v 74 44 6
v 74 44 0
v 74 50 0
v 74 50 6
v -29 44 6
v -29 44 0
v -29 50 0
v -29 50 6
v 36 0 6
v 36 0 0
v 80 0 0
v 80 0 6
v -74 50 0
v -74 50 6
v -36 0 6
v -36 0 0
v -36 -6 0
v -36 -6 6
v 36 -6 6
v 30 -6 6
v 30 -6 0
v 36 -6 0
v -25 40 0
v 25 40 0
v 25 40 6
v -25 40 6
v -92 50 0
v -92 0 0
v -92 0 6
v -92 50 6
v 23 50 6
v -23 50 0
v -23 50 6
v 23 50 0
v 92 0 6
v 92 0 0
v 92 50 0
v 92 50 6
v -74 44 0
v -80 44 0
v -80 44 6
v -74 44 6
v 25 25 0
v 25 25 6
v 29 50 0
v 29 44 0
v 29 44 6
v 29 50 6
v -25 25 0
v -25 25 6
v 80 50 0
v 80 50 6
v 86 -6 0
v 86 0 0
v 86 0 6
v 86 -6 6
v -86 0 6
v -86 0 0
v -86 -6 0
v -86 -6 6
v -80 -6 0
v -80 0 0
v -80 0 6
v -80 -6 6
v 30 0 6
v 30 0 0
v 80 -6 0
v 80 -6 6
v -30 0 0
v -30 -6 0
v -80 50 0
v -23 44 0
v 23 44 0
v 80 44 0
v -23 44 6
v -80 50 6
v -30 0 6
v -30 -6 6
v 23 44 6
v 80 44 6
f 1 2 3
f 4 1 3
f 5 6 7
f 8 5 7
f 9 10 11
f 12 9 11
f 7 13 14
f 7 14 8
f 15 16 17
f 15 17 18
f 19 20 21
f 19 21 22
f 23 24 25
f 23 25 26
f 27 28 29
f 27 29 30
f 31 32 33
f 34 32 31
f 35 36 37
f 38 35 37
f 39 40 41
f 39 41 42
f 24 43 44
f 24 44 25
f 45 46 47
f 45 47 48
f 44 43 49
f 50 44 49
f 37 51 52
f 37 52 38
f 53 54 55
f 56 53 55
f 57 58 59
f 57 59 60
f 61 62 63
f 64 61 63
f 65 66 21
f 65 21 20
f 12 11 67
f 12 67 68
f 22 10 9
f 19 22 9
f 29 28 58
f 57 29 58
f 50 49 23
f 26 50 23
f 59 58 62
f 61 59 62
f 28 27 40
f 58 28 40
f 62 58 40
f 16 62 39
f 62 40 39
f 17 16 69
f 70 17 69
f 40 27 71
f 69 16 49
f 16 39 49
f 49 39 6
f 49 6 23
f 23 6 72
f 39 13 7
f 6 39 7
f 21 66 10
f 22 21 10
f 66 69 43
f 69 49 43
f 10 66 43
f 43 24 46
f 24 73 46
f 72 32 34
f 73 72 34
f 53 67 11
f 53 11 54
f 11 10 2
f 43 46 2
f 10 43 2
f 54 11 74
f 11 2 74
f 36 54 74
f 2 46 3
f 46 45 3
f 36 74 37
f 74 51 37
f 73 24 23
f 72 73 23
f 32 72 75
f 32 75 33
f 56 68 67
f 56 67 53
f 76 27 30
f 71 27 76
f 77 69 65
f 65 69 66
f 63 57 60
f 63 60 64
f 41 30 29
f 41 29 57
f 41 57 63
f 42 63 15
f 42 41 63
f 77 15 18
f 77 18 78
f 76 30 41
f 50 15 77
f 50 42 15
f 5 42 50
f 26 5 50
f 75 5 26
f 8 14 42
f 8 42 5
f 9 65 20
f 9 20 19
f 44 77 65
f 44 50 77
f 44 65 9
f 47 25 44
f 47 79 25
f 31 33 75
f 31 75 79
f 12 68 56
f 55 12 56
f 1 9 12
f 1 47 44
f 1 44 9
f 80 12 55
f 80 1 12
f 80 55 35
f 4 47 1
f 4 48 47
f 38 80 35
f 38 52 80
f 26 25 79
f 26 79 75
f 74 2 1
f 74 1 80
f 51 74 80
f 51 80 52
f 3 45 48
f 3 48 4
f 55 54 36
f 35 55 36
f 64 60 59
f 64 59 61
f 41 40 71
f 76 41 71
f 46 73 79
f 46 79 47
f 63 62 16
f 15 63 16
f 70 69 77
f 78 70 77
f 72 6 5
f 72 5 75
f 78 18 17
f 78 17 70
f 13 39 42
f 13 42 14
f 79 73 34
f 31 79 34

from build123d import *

# Parameters (mm, degrees)
SKETCH1_W           = 184
SKETCH1_H           = 50
BOSS_EXTRUDE2_DEPTH = 6
SKETCH7_W           = 6
SKETCH7_H           = 6
CUT_EXTRUDE3_DEPTH  = 6
SKETCH8_W           = 50
SKETCH8_H           = 15
CUT_EXTRUDE4_DEPTH  = 6
SKETCH9_W           = 6
SKETCH9_H           = 6
BOSS_EXTRUDE3_DEPTH = 6


with BuildPart() as part:
    # Sketch1 → Boss-Extrude2 (new body)
    with BuildSketch(Plane.XY):
        with Locations((0, 25)):
            Rectangle(SKETCH1_W, SKETCH1_H)
    extrude(amount=BOSS_EXTRUDE2_DEPTH)

    # Sketch7 → Cut-Extrude3 (cut)
    with BuildSketch(Plane.XY):
        with Locations((77, 47)):
            Rectangle(SKETCH7_W, SKETCH7_H)
        with Locations((26, 47)):
            Rectangle(SKETCH7_W, SKETCH7_H)
        with Locations((-77, 47)):
            Rectangle(SKETCH7_W, SKETCH7_H)
        with Locations((-26, 47)):
            Rectangle(SKETCH7_W, SKETCH7_H)
    extrude(amount=CUT_EXTRUDE3_DEPTH, mode=Mode.SUBTRACT)

    # Sketch8 → Cut-Extrude4 (cut)
    with BuildSketch(Plane(origin=(0, 0, 0), x_dir=(-1, 0, 0), z_dir=(0, 0, -1))):
        with Locations((0, 32.5)):
            Rectangle(SKETCH8_W, SKETCH8_H)
    extrude(amount=-CUT_EXTRUDE4_DEPTH, mode=Mode.SUBTRACT)

    # Sketch9 → Boss-Extrude3 (add)
    with BuildSketch(Plane.XZ):
        with Locations((-83, 3)):
            Rectangle(SKETCH9_W, SKETCH9_H)
        with Locations((-33, 3)):
            Rectangle(SKETCH9_W, SKETCH9_H)
        with Locations((33, 3)):
            Rectangle(SKETCH9_W, SKETCH9_H)
        with Locations((83, 3)):
            Rectangle(SKETCH9_W, SKETCH9_H)
    extrude(amount=BOSS_EXTRUDE3_DEPTH)


solid = part.part
